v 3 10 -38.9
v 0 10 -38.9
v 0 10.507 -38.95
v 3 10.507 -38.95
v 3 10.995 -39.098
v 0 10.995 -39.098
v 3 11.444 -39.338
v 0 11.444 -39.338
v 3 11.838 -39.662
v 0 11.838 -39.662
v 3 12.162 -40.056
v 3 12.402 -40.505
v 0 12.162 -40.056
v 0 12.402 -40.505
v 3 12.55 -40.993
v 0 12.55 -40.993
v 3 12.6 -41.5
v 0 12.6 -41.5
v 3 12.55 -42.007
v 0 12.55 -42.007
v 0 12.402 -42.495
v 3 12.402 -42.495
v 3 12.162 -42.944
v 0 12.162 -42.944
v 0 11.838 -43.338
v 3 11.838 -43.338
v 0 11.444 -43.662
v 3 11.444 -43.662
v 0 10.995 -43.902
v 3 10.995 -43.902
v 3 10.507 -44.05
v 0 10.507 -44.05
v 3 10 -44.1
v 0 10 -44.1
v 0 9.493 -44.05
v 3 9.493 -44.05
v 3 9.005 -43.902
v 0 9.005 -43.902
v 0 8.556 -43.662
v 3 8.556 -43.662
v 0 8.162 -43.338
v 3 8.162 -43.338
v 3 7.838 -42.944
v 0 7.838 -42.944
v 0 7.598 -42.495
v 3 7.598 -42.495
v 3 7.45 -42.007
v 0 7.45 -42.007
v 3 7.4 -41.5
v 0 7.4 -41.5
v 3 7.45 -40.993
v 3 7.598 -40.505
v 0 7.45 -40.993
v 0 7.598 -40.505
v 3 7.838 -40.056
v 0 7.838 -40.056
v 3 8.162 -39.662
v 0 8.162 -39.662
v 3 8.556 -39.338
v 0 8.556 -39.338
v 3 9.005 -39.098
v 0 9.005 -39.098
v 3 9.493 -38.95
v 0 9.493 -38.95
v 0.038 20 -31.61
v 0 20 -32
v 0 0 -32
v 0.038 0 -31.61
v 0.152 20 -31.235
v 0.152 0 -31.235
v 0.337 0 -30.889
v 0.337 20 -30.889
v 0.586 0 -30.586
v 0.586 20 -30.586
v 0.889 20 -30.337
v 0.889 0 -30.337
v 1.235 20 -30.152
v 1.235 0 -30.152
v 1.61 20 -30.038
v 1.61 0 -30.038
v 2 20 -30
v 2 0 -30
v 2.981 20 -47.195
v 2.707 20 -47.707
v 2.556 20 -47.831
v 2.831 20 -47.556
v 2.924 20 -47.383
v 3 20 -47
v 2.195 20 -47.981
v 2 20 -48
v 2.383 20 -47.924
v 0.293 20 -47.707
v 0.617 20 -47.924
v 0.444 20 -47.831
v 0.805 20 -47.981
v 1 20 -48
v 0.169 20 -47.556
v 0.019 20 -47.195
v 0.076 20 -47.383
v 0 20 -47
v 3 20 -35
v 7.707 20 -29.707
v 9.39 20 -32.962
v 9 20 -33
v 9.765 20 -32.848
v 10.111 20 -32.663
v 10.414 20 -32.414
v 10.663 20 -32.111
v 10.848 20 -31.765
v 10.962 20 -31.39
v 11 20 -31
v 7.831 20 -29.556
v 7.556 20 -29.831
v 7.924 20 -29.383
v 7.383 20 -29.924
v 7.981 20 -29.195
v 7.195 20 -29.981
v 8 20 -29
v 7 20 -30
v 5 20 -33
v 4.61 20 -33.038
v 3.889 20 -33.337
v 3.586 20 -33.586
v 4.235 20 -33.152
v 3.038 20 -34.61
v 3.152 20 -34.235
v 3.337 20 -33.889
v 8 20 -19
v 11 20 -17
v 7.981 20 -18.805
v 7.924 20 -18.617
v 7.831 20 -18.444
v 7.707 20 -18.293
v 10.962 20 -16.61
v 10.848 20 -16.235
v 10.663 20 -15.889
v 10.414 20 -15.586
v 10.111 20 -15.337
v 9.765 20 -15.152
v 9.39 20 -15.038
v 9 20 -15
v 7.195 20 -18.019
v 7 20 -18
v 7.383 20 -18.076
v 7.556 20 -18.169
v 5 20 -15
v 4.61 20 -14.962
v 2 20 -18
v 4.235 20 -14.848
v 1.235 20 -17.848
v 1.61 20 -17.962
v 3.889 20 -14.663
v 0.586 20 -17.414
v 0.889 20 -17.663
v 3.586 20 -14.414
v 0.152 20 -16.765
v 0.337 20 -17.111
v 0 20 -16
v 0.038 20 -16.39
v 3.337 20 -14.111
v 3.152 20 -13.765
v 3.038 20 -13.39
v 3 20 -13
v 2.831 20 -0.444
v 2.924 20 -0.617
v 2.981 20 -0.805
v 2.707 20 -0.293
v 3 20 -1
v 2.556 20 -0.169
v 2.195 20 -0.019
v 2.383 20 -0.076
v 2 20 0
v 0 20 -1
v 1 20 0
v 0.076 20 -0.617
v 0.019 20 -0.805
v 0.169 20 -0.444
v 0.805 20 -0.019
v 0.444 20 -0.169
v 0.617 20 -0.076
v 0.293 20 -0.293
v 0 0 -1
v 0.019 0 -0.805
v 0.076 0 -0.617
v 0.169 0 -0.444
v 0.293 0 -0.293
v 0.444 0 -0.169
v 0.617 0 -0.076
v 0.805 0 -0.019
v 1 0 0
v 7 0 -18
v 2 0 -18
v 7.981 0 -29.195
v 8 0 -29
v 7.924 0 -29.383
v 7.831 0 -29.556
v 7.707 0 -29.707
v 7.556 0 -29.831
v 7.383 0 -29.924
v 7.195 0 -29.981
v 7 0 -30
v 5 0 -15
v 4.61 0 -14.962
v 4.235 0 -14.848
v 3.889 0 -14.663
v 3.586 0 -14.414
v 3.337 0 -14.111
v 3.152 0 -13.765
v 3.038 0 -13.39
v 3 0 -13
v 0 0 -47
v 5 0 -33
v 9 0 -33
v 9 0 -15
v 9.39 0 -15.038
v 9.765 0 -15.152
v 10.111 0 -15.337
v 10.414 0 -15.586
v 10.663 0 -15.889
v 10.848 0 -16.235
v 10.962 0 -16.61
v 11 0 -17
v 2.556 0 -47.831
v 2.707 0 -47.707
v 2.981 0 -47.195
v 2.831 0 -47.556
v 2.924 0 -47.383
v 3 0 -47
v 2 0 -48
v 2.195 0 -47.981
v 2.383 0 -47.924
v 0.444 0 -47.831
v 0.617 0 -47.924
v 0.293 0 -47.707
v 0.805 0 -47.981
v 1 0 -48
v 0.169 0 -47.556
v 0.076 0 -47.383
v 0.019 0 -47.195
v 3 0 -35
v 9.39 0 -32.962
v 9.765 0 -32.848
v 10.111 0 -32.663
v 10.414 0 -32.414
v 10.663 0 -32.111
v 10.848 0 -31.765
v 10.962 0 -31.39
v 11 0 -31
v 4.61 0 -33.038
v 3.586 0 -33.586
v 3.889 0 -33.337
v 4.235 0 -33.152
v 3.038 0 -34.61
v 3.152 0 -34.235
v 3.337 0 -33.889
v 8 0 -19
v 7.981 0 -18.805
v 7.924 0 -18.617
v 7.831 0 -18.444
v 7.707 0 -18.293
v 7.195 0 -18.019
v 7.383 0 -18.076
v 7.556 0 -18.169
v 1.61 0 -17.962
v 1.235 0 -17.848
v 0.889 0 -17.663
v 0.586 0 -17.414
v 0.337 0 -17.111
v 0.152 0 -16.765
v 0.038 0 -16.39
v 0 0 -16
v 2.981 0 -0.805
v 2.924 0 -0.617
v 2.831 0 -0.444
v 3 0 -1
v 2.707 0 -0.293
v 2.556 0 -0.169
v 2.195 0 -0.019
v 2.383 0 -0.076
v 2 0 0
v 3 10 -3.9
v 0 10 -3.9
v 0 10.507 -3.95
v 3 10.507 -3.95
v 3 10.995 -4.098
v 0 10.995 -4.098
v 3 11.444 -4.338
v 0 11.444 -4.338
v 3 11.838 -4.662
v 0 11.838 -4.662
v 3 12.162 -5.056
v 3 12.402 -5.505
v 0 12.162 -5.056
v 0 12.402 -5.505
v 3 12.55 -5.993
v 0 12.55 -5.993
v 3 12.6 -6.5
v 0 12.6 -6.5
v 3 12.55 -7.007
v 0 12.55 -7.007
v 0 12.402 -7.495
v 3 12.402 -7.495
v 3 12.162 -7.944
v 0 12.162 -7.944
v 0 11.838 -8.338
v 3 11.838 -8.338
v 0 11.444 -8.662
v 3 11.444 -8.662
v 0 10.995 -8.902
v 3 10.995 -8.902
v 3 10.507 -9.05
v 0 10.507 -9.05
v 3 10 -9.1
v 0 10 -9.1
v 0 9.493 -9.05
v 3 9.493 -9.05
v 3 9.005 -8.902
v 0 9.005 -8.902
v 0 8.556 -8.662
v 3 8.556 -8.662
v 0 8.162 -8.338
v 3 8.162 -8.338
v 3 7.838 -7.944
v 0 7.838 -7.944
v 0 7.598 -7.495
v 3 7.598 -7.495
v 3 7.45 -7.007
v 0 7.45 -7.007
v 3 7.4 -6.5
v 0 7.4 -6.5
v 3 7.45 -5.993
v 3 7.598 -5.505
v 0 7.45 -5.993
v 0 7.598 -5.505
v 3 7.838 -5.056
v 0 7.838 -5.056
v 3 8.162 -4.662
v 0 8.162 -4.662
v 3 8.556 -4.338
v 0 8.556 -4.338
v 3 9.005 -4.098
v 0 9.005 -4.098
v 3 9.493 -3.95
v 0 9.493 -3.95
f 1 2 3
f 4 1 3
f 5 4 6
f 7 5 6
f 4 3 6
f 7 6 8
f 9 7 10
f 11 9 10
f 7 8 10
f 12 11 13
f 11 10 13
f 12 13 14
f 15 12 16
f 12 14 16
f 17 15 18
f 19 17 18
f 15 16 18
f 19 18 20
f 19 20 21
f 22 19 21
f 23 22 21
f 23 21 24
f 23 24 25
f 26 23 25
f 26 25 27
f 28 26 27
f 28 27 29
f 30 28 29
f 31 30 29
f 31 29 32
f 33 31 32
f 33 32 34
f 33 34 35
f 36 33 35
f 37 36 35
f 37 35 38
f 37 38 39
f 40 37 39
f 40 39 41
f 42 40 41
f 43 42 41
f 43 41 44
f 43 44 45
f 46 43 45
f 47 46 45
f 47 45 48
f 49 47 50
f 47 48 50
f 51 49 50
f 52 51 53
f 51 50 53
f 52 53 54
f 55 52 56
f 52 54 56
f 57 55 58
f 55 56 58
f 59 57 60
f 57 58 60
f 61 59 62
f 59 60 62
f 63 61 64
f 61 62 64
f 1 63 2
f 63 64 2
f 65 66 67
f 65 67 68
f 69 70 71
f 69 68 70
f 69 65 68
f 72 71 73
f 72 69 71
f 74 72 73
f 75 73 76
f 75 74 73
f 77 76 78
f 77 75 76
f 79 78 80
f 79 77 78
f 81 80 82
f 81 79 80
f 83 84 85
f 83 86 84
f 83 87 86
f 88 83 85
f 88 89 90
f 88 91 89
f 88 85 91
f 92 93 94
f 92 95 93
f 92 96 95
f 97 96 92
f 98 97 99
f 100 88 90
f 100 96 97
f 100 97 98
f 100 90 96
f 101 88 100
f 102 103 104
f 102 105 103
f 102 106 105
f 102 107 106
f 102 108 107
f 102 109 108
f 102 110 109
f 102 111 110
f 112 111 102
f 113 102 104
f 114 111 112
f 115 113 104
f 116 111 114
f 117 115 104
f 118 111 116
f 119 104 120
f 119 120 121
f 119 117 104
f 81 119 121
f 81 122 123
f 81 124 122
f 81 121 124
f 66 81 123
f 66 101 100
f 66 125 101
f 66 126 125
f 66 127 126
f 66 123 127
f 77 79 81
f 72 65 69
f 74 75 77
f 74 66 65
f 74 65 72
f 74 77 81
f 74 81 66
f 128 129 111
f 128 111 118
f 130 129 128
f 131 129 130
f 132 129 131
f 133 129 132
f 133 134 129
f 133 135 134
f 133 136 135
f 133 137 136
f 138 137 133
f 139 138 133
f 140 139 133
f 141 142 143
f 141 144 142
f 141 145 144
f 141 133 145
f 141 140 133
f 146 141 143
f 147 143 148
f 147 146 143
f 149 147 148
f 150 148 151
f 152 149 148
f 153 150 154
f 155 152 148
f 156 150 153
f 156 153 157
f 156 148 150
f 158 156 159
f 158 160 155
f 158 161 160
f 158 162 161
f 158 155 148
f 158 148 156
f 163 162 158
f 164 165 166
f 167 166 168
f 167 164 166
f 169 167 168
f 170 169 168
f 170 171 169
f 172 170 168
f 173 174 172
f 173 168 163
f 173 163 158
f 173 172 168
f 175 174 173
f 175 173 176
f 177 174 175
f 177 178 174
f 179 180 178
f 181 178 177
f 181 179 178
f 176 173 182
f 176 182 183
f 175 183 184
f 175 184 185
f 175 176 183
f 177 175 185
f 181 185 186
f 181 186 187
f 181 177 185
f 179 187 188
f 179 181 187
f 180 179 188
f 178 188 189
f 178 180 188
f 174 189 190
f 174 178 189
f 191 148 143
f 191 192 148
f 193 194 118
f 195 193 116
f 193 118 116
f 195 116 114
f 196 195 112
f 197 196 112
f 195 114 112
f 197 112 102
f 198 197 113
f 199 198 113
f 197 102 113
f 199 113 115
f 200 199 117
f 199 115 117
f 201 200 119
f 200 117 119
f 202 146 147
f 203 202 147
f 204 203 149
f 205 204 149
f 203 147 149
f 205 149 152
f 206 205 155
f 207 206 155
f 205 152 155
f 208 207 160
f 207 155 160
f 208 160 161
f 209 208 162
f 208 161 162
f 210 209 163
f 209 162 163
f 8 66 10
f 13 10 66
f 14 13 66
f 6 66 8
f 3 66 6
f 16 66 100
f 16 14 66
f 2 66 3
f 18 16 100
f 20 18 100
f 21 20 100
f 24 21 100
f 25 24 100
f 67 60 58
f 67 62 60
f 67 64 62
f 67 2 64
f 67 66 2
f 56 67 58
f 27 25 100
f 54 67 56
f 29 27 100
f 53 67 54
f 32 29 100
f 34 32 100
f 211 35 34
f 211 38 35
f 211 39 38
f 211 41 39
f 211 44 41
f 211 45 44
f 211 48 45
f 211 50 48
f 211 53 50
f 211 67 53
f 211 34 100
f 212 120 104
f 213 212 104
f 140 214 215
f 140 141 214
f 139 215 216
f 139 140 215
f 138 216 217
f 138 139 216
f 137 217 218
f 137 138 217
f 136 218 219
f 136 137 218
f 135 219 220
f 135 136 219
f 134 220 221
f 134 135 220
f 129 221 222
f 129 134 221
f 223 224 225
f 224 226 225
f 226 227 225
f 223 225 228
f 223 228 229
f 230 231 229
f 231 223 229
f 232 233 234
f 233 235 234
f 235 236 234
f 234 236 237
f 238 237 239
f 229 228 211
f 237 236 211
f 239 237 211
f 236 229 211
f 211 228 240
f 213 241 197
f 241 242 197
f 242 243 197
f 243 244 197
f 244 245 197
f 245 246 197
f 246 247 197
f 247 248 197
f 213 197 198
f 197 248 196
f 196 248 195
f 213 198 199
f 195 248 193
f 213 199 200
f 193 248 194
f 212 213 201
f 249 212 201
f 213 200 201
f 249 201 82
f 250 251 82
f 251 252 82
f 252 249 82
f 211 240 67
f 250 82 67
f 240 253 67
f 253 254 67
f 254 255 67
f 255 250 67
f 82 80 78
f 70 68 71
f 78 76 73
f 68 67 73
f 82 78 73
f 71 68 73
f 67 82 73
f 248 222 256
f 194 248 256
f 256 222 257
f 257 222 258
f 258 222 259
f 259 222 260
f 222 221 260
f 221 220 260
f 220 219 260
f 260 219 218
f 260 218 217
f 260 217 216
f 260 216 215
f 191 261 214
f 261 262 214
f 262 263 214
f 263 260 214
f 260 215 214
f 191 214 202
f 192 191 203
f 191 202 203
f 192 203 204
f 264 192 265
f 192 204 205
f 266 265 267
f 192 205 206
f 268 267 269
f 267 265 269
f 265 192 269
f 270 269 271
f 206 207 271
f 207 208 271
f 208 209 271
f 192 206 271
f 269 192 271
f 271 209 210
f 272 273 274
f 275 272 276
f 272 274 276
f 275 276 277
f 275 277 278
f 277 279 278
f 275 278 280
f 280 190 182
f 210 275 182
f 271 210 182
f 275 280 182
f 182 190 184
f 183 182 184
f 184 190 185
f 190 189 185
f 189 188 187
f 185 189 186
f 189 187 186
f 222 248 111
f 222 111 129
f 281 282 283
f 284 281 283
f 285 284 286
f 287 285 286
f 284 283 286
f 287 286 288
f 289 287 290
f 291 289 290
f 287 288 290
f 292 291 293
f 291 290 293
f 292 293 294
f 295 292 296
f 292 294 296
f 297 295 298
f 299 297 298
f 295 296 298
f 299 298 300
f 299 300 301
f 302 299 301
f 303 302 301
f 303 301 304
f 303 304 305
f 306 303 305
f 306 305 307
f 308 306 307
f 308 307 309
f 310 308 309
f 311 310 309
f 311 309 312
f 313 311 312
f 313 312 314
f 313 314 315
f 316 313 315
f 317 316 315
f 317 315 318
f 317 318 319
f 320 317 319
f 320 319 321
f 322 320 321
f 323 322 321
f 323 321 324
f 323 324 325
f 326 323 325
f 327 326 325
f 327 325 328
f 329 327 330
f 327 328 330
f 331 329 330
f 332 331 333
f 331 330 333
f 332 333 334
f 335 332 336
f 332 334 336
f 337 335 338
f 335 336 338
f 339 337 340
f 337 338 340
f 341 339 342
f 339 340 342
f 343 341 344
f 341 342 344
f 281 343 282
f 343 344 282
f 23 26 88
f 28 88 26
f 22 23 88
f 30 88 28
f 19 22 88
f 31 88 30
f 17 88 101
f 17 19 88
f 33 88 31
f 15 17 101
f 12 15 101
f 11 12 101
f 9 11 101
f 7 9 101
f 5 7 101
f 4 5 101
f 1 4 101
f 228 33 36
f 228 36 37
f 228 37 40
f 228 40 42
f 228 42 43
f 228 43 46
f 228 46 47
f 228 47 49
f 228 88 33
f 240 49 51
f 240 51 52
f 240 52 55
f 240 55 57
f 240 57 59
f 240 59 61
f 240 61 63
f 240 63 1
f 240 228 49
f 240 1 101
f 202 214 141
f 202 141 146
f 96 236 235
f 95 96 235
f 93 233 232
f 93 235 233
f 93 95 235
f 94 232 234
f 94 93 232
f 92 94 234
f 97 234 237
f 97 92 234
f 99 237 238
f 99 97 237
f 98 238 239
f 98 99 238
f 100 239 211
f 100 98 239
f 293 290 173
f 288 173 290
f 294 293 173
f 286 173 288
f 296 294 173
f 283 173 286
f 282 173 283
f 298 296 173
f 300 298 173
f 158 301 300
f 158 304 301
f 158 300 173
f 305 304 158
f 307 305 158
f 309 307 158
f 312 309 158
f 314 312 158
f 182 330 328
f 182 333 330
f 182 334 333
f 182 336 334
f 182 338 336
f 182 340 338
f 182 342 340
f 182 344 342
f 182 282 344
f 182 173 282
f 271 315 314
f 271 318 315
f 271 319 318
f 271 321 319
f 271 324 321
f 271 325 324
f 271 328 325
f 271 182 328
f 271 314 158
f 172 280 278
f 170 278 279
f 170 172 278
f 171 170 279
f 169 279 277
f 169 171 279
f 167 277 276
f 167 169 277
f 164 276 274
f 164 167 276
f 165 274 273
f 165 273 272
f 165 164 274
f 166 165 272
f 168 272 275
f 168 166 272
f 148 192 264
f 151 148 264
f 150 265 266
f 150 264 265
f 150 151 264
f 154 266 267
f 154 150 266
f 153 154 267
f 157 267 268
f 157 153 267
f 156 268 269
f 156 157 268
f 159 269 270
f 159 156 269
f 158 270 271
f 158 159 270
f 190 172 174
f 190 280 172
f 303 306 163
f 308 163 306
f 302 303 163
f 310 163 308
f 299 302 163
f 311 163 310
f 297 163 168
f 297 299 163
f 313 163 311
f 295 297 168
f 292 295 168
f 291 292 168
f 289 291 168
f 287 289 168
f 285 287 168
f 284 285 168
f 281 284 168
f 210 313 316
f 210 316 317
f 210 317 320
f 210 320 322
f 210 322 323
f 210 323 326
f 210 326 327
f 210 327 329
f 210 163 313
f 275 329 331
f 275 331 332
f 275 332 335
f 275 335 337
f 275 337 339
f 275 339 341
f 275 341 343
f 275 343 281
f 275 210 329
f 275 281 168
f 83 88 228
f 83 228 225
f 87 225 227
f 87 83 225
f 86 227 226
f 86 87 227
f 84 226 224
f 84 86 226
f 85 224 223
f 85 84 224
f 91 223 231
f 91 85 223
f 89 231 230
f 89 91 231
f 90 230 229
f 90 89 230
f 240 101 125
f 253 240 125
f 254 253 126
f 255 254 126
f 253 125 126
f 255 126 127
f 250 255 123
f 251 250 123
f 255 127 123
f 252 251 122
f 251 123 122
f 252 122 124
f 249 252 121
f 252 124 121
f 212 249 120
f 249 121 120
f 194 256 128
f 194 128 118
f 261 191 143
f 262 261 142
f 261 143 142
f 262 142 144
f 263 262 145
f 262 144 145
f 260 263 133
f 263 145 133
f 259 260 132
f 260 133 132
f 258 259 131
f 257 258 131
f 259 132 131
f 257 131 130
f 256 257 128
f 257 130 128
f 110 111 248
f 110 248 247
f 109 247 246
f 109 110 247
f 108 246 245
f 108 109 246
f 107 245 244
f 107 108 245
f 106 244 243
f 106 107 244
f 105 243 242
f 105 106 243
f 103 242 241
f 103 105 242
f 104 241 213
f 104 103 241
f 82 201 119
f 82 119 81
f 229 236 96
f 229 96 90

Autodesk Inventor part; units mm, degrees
ref_plane "YZ Plane" through (0, 0, 0) normal (1, 0, 0) x (0, 1, 0)
ref_plane "XZ Plane" through (0, 0, 0) normal (0, 1, 0) x (-1, 0, 0)
ref_plane "XY Plane" through (0, 0, 0) normal (0, 0, 1) x (1, 0, 0)
sketch "Szkic1" plane through (0, 0, 0) normal (0, 1, 0) x (-1, 0, 0)
  line L0 (0, 0) -> (0, -18)
  line L1 (0, -18) -> (-8, -18)
  line L2 (-8, -18) -> (-8, -30)
  line L3 (-8, -30) -> (0, -30)
  line L4 (0, -30) -> (0, -48)
  line L5 (0, -48) -> (-3, -48)
  line L6 (-3, -48) -> (-3, -33)
  line L7 (-3, -33) -> (-11, -33)
  line L8 (-11, -33) -> (-11, -15)
  line L9 (-11, -15) -> (-3, -15)
  line L10 (-3, -15) -> (-3, 0)
  line L11 (-3, 0) -> (0, 0)
  dimension "d0" = 48
  dimension "d2" = 8
  dimension "d3" = 12
  dimension "d4" = 3
  dimension "d5" = 3
  dimension "d6" = 3
extrude "Wyciągnięcie proste1" add sketch "Szkic1" along normal blind 20
fillet "Zaokrąglenie1" radius 2 6 edges at (11, 10, -15) (3, 10, -15) (11, 10, -33) (3, 10, -33) (0, 10, -18) (0, 10, -30)
fillet "Zaokrąglenie2" radius 1 6 edges at (3, 10, 0) (0, 10, 0) (0, 10, -48) (3, 10, -48) (8, 10, -30) (8, 10, -18)
sketch "Szkic2" plane through (0, 0, -32) normal (-1, 0, 0) x (0, 0, 1)
  line L0 (-15, 0) -> (-15, 20) projected
  line L1 (-15, 0) -> (0, 0) projected
  line L2 (0, 20) -> (0, 0) projected
  line L3 (-15, 20) -> (0, 20) projected
  line L4 (31, 20) -> (31, 0) projected
  line L5 (16, 20) -> (31, 20) projected
  line L6 (16, 0) -> (16, 20) projected
  line L7 (16, 0) -> (31, 0) projected
  line L8 (15, 0) -> (1, 0) projected
  line L9 (8, 0) -> (8, 20) construction
  line L10 (3, 20) -> (13, 20) projected
  circle A0 centre (-9.5, 10) radius 2.6
  circle A1 centre (25.5, 10) radius 2.6
  point P0 (32, 0)
  dimension "d11" = 5.2
  dimension "d13" = 10
  dimension "d14" = 35
extrude "Wyciągnięcie proste2" cut sketch "Szkic2" against normal up to surface (3 mm away) contours A0 | A1
properties part number "motor_clamp_v2"
